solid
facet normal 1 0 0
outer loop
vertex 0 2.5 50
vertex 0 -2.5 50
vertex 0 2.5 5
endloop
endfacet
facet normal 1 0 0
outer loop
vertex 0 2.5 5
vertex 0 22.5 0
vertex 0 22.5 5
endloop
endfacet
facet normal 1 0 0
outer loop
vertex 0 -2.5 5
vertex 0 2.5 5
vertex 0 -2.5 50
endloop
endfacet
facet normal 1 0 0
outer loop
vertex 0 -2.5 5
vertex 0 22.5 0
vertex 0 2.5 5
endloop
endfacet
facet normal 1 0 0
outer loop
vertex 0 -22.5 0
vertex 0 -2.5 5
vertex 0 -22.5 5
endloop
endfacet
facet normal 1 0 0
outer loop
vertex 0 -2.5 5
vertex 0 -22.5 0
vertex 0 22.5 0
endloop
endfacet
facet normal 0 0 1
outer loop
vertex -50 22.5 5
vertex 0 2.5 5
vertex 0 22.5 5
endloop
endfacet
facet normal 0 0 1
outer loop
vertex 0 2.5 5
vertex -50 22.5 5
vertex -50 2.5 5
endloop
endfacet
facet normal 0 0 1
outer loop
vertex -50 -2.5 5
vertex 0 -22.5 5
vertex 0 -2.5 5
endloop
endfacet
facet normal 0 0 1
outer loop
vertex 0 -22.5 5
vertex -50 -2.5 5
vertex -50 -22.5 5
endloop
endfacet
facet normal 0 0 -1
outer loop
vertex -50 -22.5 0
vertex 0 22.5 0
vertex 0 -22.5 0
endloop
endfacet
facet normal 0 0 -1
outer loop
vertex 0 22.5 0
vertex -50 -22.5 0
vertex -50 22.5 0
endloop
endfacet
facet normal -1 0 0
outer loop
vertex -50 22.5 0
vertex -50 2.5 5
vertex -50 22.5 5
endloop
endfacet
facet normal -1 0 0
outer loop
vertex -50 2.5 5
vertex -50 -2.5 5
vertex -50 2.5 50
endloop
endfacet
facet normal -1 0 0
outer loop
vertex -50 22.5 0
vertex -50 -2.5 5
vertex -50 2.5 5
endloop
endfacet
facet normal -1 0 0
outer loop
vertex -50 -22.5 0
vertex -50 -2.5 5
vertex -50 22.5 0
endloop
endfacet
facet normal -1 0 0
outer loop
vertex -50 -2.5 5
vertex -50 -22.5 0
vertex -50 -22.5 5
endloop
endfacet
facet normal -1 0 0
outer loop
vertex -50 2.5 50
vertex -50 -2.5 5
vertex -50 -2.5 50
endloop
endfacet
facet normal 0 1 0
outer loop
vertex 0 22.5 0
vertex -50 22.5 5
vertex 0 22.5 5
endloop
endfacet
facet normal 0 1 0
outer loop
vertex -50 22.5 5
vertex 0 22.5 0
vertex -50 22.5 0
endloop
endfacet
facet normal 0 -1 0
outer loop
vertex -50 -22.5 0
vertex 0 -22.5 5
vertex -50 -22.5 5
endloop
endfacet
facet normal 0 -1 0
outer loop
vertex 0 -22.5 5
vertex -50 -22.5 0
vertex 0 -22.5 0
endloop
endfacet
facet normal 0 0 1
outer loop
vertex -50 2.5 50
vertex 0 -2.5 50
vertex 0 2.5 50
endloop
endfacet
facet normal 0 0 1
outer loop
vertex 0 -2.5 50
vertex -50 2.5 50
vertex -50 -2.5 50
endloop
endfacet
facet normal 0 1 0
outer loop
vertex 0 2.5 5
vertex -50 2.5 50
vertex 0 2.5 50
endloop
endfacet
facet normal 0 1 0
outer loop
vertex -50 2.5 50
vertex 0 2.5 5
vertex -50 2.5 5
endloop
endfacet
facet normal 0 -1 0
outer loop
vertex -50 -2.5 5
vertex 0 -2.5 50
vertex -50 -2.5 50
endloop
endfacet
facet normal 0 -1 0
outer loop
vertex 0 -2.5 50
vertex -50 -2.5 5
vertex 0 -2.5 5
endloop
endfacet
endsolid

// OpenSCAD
// Built by bench/smallmodels/features/compiler.py from a list of features.
$fn = 64;
difference() {
  union() {
    translate([-25, 0, 0]) translate([-25, -22.5, 0]) cube([50, 45, 5]);
    translate([-25, 0, 0]) translate([-25, -2.5, 0]) cube([50, 5, 50]);
  }
  union() {
    translate([-17, 30, 3.75]) rotate([0, 0, 0]) rotate([0, 90, 0]) cylinder(d = 4.5, h = 1200, center = true);
    translate([17, 30, 3.75]) rotate([0, 0, 0]) rotate([0, 90, 0]) cylinder(d = 4.5, h = 1200, center = true);
  }
}
difference() {
  union() {
    translate([-25, 0, 0]) translate([-25, -2.5, 0]) cube([50, 5, 50]);
  }
  union() {
    translate([0, 2.5, -1]) rotate([0, 0, 0]) cylinder(d = 23, h = 52);
    translate([-15.5, 2.5, 28]) rotate([0, 0, 0]) translate([-3.4, -3.4, 0]) cube([6.8, 6.8, 10]);
    translate([15.5, 2.5, 28]) rotate([0, 0, 0]) translate([-3.4, -3.4, 0]) cube([6.8, 6.8, 10]);
    translate([-15.5, -15.5, 28]) rotate([0, 0, 0]) translate([-3.4, -3.4, 0]) cube([6.8, 6.8, 10]);
    translate([15.5, -15.5, 28]) rotate([0, 0, 0]) translate([-3.4, -3.4, 0]) cube([6.8, 6.8, 10]);
  }
}
